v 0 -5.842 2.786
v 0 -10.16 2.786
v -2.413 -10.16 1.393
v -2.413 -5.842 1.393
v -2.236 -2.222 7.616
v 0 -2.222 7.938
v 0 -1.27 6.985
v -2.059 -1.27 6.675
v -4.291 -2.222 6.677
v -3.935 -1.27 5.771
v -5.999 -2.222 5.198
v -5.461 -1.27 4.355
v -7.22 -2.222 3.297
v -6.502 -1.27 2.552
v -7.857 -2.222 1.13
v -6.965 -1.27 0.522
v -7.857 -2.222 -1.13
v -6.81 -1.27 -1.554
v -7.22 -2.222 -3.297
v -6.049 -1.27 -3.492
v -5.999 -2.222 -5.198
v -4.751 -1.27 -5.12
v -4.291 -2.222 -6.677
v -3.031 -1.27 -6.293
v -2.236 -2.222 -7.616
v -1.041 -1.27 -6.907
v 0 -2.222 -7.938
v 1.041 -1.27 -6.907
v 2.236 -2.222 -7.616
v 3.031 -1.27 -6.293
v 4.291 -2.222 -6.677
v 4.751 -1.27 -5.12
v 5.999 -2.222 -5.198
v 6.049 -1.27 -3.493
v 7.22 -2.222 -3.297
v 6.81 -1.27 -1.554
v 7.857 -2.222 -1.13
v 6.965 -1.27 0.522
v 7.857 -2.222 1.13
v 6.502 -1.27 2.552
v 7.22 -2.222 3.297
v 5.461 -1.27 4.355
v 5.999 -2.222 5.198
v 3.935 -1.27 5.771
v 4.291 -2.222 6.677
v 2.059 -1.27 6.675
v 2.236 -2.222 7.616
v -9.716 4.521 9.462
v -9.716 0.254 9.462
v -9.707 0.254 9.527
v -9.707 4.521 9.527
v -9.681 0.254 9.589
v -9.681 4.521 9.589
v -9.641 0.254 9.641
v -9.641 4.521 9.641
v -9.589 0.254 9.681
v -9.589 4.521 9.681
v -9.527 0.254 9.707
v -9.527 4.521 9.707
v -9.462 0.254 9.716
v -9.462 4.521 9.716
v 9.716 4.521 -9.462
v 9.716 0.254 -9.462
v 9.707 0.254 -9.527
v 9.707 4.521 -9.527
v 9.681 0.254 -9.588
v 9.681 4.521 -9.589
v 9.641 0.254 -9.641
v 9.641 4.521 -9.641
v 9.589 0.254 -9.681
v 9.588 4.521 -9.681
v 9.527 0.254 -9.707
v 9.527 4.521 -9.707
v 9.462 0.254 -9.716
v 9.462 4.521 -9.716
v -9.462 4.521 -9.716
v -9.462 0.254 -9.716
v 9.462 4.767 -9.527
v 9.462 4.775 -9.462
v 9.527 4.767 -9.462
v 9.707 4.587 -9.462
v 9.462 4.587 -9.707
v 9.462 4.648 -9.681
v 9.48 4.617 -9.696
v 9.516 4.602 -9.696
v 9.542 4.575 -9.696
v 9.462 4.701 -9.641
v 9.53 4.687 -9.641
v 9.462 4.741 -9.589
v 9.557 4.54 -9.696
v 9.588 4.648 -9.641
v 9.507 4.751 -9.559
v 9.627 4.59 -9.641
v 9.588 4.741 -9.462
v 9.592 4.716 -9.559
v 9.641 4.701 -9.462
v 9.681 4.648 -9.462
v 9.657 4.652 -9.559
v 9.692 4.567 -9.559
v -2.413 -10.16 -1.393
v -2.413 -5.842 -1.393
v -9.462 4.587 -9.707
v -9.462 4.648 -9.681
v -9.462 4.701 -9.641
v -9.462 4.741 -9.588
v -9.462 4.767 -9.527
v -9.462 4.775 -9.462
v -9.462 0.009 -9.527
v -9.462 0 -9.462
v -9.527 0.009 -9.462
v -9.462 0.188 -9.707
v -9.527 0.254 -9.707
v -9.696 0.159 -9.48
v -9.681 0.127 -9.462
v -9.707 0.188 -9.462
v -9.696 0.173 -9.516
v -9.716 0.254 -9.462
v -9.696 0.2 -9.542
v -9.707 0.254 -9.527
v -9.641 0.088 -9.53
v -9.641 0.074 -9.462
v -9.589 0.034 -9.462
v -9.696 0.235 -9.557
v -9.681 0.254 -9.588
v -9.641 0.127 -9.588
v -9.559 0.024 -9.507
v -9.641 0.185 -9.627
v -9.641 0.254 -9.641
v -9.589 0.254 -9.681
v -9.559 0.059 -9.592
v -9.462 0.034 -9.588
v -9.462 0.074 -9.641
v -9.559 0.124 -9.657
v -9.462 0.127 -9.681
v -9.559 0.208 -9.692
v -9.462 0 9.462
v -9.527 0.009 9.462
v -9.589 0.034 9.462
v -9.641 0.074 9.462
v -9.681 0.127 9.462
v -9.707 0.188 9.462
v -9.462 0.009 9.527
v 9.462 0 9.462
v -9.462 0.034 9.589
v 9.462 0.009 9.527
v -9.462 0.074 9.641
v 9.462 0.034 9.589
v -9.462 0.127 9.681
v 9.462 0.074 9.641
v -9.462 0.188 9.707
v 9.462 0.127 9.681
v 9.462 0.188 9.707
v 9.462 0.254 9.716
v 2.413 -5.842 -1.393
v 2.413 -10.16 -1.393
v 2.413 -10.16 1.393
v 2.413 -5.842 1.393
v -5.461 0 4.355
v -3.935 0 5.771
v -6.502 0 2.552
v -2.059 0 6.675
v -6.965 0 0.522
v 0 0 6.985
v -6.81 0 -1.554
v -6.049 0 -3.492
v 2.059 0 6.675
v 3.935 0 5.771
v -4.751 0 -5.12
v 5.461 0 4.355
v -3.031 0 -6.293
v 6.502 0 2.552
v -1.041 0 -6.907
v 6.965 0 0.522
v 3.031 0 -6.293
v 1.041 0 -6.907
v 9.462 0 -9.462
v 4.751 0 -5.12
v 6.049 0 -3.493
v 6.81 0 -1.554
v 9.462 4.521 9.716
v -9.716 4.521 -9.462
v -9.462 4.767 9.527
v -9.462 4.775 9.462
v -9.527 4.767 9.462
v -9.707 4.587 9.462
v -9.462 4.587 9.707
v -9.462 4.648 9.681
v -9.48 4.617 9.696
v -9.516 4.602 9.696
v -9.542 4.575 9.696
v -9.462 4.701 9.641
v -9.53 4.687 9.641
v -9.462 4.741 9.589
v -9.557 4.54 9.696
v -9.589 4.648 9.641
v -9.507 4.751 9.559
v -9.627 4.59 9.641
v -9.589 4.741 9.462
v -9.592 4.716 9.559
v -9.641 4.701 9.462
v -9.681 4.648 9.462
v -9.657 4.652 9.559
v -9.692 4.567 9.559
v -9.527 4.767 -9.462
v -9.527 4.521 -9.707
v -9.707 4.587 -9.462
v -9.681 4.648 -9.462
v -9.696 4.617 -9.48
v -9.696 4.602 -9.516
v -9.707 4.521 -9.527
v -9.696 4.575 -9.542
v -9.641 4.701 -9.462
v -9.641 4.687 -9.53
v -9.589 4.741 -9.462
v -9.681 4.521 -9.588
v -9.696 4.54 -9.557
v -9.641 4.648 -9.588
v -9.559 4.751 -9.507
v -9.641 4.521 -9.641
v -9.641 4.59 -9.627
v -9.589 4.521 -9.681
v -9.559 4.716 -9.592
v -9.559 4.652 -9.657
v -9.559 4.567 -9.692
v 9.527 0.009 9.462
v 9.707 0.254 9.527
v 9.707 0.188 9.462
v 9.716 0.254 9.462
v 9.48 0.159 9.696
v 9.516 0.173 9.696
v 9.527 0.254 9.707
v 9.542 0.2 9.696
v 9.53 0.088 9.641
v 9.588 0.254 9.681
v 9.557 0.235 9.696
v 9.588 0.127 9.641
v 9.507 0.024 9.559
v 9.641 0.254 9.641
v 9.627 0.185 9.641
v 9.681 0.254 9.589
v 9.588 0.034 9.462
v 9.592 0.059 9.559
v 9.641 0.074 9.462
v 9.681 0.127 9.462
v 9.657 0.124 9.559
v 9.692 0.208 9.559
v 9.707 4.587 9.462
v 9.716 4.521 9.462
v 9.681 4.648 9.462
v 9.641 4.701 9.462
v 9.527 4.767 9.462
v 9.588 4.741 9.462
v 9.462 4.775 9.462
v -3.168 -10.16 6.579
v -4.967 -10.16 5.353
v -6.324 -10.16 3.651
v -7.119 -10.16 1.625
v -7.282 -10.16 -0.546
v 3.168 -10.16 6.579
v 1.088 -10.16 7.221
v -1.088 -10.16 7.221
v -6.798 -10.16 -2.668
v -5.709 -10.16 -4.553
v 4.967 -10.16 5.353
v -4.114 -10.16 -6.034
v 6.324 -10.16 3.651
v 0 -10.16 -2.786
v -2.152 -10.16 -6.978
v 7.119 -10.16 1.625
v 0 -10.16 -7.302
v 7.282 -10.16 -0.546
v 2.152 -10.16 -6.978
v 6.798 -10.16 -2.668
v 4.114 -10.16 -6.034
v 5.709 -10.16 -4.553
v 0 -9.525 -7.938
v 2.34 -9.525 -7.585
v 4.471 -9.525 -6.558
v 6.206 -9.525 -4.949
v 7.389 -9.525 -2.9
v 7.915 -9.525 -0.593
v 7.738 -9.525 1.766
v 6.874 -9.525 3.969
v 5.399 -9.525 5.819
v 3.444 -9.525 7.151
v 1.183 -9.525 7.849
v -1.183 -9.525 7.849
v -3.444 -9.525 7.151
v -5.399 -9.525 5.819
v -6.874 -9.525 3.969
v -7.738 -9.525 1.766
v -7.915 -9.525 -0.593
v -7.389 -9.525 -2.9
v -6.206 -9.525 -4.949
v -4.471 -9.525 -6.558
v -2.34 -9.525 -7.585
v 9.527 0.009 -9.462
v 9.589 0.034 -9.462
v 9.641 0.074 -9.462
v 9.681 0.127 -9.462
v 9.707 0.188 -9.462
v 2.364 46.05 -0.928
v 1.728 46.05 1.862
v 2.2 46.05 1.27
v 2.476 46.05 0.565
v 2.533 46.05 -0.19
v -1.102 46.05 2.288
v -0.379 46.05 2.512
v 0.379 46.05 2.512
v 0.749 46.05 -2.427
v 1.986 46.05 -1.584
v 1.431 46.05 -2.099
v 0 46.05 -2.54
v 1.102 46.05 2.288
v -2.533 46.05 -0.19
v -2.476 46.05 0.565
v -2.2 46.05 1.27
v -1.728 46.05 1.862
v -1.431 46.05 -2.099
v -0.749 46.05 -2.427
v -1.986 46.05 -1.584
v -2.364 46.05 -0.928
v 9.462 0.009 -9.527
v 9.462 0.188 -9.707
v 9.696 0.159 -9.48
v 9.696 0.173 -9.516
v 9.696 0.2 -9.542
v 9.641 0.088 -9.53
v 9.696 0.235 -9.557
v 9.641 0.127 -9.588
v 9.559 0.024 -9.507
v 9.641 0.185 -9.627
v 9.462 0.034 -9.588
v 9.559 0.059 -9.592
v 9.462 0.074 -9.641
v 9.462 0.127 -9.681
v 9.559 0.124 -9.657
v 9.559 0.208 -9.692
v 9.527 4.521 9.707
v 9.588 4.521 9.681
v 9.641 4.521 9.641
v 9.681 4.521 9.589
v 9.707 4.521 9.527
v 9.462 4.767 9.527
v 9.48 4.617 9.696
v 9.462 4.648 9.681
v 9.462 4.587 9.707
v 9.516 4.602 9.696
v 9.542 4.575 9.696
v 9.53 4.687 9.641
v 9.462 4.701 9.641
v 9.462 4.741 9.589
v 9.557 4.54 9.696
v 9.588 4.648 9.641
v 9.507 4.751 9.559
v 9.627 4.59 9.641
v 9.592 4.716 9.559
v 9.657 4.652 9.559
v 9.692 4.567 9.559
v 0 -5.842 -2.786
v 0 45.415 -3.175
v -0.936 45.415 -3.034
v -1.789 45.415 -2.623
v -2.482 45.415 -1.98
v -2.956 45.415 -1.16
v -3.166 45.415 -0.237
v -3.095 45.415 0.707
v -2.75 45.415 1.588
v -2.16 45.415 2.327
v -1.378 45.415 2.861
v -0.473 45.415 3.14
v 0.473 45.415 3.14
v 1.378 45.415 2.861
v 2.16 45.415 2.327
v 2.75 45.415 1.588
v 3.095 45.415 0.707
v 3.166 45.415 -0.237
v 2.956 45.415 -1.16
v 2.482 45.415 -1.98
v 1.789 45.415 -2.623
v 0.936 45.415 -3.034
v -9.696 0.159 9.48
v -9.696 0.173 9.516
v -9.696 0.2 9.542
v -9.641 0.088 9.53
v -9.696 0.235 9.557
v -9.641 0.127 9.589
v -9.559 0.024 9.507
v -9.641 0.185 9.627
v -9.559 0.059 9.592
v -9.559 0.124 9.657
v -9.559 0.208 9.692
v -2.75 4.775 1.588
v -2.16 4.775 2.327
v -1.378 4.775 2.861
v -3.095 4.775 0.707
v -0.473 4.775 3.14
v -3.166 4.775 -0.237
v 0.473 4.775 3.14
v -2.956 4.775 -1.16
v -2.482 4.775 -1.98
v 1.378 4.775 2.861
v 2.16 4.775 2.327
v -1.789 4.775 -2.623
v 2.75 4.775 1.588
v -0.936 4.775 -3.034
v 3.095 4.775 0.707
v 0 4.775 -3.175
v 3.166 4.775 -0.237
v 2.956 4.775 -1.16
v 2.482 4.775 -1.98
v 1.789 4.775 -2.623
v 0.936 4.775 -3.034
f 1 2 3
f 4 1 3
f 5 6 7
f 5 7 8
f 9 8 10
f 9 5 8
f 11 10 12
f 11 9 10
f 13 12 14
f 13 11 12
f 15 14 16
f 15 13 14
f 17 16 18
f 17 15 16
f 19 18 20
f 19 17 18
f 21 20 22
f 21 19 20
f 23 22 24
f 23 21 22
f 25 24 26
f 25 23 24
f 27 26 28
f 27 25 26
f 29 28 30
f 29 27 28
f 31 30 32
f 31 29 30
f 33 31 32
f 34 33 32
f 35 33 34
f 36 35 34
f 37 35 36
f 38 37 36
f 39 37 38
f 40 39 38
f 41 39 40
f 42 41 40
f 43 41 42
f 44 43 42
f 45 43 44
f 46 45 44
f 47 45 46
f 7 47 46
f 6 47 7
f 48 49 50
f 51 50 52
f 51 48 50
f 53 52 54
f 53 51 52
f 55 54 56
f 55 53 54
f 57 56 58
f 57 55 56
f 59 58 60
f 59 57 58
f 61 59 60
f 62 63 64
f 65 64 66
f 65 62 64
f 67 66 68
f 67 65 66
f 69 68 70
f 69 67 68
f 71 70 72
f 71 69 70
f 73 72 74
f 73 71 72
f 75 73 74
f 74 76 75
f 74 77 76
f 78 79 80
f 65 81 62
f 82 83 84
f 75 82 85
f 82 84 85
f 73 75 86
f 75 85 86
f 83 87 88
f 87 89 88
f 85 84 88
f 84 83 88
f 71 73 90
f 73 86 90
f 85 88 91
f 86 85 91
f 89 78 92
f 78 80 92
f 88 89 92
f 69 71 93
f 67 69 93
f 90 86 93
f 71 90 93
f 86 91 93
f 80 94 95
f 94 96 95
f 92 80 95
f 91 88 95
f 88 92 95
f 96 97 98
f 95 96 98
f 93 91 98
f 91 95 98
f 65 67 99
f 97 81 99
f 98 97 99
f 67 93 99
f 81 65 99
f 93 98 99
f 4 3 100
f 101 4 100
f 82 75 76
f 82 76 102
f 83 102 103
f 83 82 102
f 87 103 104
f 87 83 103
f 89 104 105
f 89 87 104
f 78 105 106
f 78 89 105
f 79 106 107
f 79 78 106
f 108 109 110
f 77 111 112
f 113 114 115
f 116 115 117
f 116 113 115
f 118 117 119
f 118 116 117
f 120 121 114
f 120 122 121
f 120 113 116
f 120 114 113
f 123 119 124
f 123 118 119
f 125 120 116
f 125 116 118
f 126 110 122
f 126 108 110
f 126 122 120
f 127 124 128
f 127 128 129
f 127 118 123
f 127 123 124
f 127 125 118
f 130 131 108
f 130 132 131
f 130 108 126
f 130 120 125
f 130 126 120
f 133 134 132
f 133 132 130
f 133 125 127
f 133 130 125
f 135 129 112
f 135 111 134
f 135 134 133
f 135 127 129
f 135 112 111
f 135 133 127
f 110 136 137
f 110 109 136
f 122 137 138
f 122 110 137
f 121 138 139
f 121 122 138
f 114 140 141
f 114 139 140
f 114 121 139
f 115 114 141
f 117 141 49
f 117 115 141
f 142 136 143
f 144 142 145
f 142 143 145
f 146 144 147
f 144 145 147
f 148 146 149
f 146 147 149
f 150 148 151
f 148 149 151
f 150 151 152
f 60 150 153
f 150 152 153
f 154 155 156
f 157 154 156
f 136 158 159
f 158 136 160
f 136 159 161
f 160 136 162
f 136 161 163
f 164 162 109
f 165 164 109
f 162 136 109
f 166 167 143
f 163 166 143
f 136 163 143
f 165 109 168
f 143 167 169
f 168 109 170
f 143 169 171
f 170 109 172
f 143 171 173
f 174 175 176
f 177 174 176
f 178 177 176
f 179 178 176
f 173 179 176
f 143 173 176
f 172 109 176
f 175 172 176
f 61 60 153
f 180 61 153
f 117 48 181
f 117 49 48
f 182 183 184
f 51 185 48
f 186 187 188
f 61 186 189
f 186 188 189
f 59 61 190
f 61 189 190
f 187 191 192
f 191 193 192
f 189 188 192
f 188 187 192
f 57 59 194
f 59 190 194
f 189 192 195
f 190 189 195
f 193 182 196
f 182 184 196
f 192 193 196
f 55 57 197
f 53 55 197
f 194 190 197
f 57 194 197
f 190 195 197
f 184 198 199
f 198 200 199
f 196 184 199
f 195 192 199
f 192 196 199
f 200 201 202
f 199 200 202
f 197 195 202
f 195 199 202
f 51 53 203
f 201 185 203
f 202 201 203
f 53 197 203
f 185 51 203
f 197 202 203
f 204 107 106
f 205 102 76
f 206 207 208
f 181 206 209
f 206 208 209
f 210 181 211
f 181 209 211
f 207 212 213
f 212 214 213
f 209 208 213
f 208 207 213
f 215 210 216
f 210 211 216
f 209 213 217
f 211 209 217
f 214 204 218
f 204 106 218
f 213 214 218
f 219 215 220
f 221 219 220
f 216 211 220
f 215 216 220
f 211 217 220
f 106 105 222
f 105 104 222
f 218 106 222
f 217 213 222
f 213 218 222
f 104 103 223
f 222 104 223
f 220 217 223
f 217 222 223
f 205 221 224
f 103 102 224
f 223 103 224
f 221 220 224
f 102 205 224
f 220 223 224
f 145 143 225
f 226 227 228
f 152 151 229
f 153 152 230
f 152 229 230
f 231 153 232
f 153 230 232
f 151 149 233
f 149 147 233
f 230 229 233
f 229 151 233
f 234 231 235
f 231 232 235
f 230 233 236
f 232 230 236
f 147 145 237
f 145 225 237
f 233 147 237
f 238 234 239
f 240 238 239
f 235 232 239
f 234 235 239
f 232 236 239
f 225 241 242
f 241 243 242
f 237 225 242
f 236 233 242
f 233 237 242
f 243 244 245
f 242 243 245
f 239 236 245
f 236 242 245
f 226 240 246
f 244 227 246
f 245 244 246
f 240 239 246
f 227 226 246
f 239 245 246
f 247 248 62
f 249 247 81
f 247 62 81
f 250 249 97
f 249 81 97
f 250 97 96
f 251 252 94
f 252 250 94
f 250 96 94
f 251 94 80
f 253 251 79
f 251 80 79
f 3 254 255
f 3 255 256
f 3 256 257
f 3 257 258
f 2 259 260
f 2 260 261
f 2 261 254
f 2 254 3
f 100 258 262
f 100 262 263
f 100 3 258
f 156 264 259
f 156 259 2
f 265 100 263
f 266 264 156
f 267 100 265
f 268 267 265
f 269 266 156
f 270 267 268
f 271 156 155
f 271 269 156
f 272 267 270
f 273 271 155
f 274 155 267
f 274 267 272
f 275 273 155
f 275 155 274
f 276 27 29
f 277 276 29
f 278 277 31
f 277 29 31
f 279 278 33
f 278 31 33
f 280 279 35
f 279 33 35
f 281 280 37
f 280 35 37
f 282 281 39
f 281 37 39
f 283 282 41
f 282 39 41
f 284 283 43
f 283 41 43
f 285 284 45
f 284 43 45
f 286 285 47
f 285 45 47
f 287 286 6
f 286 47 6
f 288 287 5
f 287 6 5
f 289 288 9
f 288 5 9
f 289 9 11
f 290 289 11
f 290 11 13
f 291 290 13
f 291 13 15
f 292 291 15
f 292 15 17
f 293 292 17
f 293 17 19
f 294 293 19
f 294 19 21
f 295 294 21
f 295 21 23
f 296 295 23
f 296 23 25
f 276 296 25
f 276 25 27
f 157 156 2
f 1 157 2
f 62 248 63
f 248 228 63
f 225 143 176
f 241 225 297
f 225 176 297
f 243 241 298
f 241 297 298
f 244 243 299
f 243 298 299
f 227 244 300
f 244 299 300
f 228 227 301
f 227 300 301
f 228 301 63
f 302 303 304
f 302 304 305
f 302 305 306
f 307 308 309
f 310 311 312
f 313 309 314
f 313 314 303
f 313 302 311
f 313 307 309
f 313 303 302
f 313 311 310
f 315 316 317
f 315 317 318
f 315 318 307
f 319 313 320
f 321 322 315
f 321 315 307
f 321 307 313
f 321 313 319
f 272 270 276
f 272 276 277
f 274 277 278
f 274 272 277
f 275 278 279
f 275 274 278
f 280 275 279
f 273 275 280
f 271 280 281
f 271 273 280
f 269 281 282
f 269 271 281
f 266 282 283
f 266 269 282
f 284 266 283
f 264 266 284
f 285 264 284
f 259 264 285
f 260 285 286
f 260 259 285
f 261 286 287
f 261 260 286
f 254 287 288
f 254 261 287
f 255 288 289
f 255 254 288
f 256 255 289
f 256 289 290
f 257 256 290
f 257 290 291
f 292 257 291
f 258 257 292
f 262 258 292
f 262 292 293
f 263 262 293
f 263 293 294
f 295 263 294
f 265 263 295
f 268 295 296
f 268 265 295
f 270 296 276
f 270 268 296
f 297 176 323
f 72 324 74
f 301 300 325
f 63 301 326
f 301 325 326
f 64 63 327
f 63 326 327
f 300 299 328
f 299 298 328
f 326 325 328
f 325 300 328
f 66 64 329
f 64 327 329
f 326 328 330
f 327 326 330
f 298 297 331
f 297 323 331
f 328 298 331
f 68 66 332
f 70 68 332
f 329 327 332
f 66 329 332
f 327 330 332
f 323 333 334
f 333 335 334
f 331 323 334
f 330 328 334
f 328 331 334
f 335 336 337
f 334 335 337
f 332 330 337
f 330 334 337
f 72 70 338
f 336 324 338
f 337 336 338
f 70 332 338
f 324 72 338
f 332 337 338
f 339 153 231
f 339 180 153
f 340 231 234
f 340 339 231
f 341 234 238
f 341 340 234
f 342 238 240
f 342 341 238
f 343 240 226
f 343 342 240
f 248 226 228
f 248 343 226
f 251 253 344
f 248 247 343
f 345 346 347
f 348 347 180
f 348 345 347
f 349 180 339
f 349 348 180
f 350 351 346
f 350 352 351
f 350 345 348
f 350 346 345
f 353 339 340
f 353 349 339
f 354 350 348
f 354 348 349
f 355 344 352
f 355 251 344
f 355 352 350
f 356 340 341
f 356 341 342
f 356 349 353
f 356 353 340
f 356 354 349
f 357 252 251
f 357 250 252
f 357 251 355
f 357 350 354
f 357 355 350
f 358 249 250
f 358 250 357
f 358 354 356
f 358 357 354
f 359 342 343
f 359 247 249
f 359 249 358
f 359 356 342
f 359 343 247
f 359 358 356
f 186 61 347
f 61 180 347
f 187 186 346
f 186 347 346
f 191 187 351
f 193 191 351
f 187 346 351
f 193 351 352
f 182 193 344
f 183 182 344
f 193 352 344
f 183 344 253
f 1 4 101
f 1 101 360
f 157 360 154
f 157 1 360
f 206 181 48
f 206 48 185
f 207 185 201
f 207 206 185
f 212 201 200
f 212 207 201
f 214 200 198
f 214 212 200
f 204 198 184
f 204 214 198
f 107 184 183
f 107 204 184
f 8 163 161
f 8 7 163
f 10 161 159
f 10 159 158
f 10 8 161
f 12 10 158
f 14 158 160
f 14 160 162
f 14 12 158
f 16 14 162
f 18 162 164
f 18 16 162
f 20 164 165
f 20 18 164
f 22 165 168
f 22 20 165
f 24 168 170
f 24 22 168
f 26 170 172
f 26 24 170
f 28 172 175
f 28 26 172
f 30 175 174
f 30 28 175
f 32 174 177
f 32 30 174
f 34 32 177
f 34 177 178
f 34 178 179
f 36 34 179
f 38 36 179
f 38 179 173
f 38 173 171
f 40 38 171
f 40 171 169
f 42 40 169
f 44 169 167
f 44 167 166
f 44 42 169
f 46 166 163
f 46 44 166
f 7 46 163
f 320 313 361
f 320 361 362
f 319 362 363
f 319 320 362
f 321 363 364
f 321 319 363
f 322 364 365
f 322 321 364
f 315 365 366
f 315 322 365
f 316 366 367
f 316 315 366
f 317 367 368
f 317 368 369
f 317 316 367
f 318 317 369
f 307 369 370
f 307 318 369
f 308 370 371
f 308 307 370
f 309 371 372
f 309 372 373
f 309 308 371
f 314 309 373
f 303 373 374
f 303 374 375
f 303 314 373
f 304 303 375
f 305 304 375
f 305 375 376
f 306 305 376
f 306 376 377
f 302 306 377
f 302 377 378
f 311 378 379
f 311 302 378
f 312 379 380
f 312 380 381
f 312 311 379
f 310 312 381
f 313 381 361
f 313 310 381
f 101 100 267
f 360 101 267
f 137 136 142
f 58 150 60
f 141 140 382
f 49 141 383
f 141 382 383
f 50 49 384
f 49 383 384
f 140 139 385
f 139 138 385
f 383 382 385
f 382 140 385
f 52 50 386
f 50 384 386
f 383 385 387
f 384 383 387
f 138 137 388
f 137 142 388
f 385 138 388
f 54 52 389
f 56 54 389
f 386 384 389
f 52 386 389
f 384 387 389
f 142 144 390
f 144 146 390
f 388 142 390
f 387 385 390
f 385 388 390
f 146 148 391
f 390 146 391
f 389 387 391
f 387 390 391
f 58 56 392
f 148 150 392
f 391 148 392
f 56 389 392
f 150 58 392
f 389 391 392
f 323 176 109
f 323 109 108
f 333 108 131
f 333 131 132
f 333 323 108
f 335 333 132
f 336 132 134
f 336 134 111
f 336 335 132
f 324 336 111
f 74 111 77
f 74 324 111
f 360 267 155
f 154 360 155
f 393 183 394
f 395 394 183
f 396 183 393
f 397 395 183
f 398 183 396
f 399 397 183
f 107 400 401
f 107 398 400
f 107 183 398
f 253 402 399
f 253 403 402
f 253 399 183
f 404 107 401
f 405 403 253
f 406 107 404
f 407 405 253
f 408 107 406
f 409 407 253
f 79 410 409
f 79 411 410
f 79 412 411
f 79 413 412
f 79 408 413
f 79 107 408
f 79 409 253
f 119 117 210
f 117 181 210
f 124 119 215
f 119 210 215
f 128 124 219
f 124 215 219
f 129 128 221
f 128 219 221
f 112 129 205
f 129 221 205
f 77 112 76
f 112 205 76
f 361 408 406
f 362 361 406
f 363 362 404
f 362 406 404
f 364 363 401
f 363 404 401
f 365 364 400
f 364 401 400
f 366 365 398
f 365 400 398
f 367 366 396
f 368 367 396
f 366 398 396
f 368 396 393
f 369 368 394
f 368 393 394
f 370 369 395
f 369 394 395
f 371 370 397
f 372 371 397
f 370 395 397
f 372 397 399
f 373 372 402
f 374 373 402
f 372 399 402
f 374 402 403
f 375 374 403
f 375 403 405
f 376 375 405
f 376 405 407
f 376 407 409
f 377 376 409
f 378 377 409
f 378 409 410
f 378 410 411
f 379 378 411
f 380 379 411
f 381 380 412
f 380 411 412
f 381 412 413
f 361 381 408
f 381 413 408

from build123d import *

# Parameters (mm, degrees)
SKETCH1_W          = 19.431
SKETCH1_H          = 19.431
EXTRUDE1_DEPTH     = 4.7752
SKETCH2_R          = 3.175
EXTRUDE2_DEPTH     = 41.275
SKETCH3_R          = 7.9375
EXTRUDE3_DEPTH     = 10.16
CHAMFER1_SIZE      = 0.635
CHAMFER2_SIZE      = 0.635
CUT_EXTRUDE1_DEPTH = 4.318
FILLET1_R          = 0.254


with BuildPart() as part:
    # Sketch1 → Extrude1 (new body)
    with BuildSketch(Plane(origin=(0, 0, 0), x_dir=(1, 0, 0), z_dir=(0, 1, 0))):
        Rectangle(SKETCH1_W, SKETCH1_H)
    extrude(amount=EXTRUDE1_DEPTH)

    # Sketch2 → Extrude2 (add)
    with BuildSketch(Plane(origin=(0, 4.7752, 0), x_dir=(-1, 0, 0), z_dir=(0, 1, 0))):
        with Locations(Location((0, 0, 0), (0, 0, 270))):  # turned: the seam where the file's is
            Circle(SKETCH2_R)
    extrude(amount=EXTRUDE2_DEPTH)

    # Sketch3 → Extrude3 (add)
    with BuildSketch(Plane.XZ):
        with Locations(Location((0, 0, 0), (0, 0, 270))):  # turned: the seam where the file's is
            Circle(SKETCH3_R)
    extrude(amount=EXTRUDE3_DEPTH)

    # Chamfer1
    chamfer1_edges = [part.edges().sort_by_distance(p)[0] for p in [
        (0, 46.0502, 3.175),
    ]]
    chamfer(chamfer1_edges, length=CHAMFER1_SIZE)

    # Sketch4 → Cut-Revolve1 (revolve, cut)
    with BuildSketch(Plane.XY, mode=Mode.PRIVATE) as cut_revolve1_sk:
        Polygon((-7.9375, 0), (-6.985, 0), (-6.985, -1.27), (-7.9375, -2.2225), align=None)
    revolve(cut_revolve1_sk.sketch.rotate(Axis((0, 0, 0), (0, -1, 0)), 270), axis=Axis((0, 0, 0), (0, -1, 0)), mode=Mode.SUBTRACT)  # turned: the seam where the file's is

    # Chamfer2
    chamfer2_edges = [part.edges().sort_by_distance(p)[0] for p in [
        (0, -10.16, 7.9375),
    ]]
    chamfer(chamfer2_edges, length=CHAMFER2_SIZE)

    # Sketch5 → Cut-Extrude1 (cut)
    with BuildSketch(Plane.XZ.offset(10.16)):
        Polygon((0, -2.786292399), (2.413, -1.3931462), (2.413, 1.3931462), (0, 2.786292399), (-2.413, 1.3931462), (-2.413, -1.3931462), align=None)
    extrude(amount=-CUT_EXTRUDE1_DEPTH, mode=Mode.SUBTRACT)

    # Fillet1
    fillet1_edges = [part.edges().sort_by_distance(p)[0] for p in [
        (9.7155, 4.7752, 0),
        (0, 4.7752, -9.7155),
        (-9.7155, 4.7752, 0),
        (0, 0, -9.7155),
        (9.7155, 0, 0),
        (0, 0, 9.7155),
        (-9.7155, 0, 0),
        (0, 4.7752, 9.7155),
        (-9.7155, 2.3876, -9.7155),
        (9.7155, 2.3876, -9.7155),
        (9.7155, 2.3876, 9.7155),
        (-9.7155, 2.3876, 9.7155),
    ]]
    fillet(fillet1_edges, radius=FILLET1_R)


solid = part.part
